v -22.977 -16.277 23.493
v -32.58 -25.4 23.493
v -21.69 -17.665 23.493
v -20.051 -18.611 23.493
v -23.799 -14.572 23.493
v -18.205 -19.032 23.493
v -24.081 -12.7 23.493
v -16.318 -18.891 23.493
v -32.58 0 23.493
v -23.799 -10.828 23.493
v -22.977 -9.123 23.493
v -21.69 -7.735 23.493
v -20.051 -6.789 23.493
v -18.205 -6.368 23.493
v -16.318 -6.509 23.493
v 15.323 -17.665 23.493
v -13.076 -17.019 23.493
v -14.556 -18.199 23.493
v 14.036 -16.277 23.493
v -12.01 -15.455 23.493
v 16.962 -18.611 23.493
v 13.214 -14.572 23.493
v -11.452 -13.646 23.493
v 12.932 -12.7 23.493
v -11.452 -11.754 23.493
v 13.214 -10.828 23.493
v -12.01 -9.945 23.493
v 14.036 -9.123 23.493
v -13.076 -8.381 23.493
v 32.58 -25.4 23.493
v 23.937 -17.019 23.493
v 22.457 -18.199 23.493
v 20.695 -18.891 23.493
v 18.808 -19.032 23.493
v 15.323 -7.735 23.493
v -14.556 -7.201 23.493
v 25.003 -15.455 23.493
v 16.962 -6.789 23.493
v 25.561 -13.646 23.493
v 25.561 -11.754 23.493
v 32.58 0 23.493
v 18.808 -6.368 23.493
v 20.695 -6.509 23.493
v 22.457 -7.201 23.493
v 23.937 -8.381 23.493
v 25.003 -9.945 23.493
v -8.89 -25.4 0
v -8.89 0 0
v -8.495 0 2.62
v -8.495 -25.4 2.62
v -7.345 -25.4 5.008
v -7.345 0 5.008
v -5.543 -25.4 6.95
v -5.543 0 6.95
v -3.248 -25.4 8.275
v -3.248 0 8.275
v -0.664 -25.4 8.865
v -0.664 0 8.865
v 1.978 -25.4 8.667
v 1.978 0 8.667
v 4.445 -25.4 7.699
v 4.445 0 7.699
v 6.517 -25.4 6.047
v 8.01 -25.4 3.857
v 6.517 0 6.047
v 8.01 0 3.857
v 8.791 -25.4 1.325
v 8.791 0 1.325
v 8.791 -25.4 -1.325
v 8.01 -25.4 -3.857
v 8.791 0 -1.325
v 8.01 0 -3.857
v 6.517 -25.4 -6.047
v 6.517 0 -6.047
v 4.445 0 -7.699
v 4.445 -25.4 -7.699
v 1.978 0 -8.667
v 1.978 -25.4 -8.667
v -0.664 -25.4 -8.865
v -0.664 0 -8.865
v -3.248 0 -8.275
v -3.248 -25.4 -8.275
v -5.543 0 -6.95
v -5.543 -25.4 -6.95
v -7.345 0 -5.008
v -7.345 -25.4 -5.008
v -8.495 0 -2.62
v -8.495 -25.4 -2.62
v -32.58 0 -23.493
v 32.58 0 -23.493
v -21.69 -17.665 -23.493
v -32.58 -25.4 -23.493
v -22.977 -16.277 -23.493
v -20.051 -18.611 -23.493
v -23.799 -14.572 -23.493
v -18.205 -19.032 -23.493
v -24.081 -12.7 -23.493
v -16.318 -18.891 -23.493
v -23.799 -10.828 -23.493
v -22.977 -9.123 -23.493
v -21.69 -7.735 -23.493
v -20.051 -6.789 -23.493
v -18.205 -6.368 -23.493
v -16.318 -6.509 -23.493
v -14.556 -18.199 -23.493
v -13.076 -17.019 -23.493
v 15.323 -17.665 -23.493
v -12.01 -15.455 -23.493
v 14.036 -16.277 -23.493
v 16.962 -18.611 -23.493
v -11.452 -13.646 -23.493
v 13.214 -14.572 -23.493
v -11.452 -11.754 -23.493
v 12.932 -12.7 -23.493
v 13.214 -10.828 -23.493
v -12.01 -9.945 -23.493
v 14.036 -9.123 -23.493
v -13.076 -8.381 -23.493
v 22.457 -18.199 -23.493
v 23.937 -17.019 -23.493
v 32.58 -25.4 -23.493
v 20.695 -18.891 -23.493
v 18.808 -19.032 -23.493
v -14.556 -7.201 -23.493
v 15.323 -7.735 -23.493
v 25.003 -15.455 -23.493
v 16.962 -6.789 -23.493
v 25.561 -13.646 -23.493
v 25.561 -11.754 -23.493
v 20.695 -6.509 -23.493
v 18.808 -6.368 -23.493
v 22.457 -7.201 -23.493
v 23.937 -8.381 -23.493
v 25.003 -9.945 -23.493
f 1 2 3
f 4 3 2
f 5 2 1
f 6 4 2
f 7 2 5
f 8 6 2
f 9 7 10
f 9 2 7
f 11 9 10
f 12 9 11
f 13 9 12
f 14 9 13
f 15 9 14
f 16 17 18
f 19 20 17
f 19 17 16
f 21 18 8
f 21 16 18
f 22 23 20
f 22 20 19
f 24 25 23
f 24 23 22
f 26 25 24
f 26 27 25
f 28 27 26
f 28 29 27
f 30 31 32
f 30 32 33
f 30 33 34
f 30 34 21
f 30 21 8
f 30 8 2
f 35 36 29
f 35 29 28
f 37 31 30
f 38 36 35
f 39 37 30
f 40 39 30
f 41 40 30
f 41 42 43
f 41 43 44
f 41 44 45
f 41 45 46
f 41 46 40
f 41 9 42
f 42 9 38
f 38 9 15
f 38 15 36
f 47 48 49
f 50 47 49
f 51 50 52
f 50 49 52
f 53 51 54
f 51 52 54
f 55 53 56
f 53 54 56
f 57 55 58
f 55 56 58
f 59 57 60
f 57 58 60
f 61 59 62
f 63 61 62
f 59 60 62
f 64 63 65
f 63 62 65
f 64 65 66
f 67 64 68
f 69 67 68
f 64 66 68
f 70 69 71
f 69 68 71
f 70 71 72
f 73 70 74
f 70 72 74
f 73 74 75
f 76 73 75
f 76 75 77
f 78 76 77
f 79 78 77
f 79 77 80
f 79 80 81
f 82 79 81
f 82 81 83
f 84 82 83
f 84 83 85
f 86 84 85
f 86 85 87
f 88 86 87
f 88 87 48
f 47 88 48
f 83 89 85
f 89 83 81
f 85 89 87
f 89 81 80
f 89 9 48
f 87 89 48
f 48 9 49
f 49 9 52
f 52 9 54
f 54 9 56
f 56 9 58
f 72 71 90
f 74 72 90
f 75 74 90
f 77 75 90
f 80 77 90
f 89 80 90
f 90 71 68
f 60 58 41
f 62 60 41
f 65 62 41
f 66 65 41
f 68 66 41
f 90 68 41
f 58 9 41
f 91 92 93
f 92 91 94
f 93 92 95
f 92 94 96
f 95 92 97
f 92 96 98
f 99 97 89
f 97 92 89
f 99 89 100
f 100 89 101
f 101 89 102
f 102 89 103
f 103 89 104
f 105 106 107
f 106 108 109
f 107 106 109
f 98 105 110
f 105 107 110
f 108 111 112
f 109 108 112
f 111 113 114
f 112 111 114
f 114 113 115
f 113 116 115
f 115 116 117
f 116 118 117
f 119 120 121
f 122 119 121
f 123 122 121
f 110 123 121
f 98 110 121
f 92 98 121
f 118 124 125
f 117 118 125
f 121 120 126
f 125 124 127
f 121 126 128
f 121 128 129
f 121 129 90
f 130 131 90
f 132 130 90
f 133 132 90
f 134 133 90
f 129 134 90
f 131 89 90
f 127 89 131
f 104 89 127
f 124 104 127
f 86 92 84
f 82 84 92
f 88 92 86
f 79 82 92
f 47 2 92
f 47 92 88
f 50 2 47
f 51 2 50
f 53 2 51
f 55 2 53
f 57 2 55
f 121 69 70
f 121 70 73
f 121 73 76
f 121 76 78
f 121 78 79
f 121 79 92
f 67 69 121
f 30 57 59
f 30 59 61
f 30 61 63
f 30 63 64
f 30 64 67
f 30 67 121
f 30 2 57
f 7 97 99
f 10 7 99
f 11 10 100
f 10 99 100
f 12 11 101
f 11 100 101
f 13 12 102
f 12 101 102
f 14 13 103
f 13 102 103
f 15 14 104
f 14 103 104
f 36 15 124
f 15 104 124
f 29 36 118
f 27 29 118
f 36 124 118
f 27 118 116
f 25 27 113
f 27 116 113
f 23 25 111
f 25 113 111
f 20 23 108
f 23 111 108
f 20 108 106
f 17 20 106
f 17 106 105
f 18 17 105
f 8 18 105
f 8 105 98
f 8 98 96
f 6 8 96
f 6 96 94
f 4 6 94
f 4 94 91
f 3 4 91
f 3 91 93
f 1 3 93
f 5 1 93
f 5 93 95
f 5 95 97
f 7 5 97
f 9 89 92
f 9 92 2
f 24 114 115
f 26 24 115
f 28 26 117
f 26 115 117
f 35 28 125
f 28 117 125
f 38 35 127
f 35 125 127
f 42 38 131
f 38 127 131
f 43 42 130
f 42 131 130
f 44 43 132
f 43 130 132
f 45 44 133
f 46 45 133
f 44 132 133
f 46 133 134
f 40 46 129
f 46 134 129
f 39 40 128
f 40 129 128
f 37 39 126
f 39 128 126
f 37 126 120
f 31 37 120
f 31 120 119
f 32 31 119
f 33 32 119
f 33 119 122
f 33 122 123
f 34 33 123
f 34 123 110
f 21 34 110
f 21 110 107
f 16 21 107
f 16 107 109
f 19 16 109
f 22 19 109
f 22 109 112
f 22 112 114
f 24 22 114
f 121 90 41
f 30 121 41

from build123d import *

# Parameters (mm, degrees)
F0_W     = 65.160498
F0_H     = 46.986484
F1_DEPTH = 25.4
F3_D     = 17.78
F5_D     = 12.7
F7_D     = 12.7


with BuildPart() as f1:
    # F0 (on Front) → F1 (new body)
    with BuildSketch(Plane.XZ):
        Rectangle(F0_W, F0_H)
    extrude(amount=F1_DEPTH)

    # F3 (through all)
    with Locations(Plane.XZ.offset(25.4)):
        with Locations((0, 0)):
            Hole(F3_D / 2)

    # F5 (through all)
    with Locations(Plane.XY.offset(23.493242)):
        with Locations((-17.730748, -12.7)):
            Hole(F5_D / 2)

    # F7 (through all)
    with Locations(Plane.XY.offset(23.493242)):
        with Locations((19.28219, -12.7)):
            Hole(F7_D / 2)


solid = f1.part
